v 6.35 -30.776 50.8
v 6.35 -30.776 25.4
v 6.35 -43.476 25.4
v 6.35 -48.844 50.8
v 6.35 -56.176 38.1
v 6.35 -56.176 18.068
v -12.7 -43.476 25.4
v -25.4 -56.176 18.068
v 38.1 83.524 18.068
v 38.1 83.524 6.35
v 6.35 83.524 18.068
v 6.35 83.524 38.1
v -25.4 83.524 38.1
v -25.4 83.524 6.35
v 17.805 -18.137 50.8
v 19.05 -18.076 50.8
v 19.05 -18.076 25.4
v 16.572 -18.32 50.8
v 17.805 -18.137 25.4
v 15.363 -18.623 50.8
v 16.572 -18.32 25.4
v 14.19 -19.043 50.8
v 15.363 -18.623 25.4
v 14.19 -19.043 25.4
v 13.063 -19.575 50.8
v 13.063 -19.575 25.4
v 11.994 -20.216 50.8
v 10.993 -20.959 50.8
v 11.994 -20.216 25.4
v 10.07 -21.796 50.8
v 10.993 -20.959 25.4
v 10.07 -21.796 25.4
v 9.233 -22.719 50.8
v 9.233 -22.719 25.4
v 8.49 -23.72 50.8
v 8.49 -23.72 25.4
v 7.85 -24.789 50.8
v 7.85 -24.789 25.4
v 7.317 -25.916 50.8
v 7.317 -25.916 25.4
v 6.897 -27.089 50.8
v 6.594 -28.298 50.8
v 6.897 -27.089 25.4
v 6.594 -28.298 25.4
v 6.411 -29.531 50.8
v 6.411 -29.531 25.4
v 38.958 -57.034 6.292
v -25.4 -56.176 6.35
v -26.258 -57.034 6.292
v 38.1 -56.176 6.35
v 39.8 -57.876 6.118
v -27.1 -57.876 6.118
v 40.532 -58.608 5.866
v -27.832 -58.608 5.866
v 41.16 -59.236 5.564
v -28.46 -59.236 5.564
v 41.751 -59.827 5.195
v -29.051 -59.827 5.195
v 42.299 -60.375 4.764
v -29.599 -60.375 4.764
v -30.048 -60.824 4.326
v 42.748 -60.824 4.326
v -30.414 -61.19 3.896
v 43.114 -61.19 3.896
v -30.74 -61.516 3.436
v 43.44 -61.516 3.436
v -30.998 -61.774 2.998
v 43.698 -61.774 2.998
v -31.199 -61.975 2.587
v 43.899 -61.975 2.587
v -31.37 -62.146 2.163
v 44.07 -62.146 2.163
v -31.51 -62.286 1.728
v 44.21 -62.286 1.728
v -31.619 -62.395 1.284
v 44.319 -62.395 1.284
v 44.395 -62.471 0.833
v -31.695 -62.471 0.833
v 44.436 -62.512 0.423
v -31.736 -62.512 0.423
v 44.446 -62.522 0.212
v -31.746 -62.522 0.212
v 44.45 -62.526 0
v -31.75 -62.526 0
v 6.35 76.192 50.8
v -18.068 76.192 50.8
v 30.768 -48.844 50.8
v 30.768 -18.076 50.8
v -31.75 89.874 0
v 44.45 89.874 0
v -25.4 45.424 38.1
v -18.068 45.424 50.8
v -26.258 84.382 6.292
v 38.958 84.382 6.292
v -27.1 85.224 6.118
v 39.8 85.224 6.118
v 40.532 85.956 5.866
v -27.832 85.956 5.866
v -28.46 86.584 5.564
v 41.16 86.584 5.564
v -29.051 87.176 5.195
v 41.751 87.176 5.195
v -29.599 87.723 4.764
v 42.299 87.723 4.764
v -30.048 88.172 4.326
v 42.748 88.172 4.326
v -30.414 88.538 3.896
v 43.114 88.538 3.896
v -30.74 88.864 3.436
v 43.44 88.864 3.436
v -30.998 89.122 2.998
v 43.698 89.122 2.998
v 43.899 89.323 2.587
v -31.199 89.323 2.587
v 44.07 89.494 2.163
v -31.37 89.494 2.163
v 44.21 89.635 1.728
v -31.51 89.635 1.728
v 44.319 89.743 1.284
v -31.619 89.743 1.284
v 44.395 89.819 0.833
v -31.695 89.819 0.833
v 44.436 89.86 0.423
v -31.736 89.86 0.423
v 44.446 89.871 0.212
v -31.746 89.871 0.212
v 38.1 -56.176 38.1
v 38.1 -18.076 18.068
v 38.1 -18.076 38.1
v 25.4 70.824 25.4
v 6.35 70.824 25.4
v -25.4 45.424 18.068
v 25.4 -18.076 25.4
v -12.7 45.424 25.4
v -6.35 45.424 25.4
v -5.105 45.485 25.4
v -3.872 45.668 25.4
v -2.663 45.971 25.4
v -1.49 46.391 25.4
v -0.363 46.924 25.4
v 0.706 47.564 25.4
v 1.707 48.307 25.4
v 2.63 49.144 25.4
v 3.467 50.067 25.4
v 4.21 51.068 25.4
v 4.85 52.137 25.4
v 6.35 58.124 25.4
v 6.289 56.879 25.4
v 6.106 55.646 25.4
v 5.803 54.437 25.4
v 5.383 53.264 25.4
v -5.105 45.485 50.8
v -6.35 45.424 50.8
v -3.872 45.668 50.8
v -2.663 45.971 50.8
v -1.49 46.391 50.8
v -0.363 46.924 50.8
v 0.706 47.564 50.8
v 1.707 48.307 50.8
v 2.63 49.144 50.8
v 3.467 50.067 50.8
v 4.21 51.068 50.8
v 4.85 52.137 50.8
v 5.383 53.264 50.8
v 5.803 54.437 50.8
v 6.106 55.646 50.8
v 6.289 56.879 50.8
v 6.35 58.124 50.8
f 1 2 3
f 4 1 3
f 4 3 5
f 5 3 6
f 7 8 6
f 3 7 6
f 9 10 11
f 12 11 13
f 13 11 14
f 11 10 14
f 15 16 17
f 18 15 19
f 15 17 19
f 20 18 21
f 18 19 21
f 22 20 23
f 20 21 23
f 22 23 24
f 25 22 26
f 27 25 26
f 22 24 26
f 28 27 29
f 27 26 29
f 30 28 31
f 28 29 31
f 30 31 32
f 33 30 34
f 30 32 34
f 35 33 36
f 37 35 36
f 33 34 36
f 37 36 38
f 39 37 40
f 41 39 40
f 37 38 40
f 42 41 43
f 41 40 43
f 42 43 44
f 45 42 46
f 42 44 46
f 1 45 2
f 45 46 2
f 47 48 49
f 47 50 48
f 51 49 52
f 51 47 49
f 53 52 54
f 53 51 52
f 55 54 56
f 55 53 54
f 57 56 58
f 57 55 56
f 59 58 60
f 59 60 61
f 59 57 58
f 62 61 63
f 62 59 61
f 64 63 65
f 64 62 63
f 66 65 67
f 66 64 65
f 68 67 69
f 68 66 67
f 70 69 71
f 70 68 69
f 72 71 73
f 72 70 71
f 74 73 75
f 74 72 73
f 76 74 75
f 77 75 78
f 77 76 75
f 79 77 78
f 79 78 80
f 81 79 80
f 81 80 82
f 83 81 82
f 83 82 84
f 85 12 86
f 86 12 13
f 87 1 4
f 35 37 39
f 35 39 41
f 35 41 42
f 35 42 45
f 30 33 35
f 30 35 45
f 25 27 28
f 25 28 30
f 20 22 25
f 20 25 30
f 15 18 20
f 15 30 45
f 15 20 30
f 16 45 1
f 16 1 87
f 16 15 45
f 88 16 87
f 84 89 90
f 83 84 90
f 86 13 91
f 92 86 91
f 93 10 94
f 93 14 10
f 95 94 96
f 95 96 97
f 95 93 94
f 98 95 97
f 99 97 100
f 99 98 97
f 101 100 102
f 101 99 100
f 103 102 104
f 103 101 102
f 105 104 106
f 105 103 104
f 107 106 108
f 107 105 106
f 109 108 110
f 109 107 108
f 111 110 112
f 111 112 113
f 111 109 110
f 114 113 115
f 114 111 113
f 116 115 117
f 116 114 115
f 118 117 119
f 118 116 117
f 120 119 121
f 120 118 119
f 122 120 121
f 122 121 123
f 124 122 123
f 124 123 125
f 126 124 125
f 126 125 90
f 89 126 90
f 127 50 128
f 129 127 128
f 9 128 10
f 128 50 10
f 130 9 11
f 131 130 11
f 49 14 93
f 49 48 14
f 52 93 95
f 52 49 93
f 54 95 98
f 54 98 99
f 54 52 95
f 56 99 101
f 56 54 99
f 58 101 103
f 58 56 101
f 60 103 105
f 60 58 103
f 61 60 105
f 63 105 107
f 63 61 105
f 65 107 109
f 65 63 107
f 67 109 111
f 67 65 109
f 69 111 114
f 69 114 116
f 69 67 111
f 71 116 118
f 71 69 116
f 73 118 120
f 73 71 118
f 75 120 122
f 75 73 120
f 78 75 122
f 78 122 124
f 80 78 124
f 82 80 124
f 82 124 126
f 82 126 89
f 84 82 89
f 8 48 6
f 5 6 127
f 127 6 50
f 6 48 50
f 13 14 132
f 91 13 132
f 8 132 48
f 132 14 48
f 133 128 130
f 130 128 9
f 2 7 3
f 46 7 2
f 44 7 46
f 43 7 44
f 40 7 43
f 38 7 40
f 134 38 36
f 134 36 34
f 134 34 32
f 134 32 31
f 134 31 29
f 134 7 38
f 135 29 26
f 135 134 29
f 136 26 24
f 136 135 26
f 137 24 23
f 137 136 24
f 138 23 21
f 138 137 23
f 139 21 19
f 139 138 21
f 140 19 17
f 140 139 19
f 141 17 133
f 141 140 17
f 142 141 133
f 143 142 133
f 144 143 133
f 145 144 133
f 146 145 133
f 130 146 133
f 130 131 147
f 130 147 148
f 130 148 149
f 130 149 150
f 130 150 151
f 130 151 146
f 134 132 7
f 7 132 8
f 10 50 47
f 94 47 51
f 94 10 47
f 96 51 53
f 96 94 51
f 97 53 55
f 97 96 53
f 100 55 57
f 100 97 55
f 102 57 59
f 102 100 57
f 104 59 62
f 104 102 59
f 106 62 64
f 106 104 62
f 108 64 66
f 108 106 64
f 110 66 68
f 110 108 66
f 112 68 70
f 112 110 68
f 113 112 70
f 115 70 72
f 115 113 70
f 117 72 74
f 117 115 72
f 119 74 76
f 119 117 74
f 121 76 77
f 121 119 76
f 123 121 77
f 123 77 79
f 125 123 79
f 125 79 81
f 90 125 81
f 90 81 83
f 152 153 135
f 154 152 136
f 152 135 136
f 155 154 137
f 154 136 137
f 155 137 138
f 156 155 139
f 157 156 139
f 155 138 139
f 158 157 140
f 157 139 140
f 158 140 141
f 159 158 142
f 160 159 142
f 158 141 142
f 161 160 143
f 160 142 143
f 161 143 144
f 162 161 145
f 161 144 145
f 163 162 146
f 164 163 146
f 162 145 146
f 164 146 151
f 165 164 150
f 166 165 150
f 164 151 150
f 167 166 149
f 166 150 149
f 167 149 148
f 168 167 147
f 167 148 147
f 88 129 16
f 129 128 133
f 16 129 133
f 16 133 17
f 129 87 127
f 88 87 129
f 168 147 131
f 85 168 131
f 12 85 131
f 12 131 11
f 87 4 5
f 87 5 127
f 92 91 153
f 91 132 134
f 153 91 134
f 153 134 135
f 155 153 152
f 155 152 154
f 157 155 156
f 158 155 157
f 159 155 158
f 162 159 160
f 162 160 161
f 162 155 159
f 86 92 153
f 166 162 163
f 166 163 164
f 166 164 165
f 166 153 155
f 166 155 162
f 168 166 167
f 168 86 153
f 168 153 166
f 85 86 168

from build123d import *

# Parameters (mm, degrees)
F1_DEPTH    = 6.35
F2_DEPTH    = 25.4
F3_DEPTH    = 50.8
F4_C1_SIZE2 = 12.7
F4_C1_SIZE  = 7.3323484187
F4_C2_SIZE2 = 12.7
F4_C2_SIZE  = 7.3323484187
F5_SIZE2    = 7.3323484187
F5_SIZE     = 12.7
F6_SIZE2    = 7.3323484187
F6_SIZE     = 12.7
F7_R        = 6.34999


# Not quite as in the source:
# - a fillet or chamfer is up to 0.001 mm smaller than in the source, because OpenCascade refuses the exact size


with BuildPart() as f1:
    # F0 (on Top) → F1 (new body)
    with BuildSketch(Plane.XY):
        Polygon((44.45, 89.8741149127), (-31.75, 89.8741149127), (-31.75, 45.4241149127), (-31.75, -62.5258850873), (44.45, -62.5258850873), align=None)
        Polygon((-25.4, -56.1758850873), (-25.4, 45.4241149127), (-25.4, 83.5241149127), (6.35, 83.5241149127), (38.1, 83.5241149127), (38.1, -18.0758850873), (38.1, -56.1758850873), (6.35, -56.1758850873), align=None, mode=Mode.SUBTRACT)
    extrude(amount=F1_DEPTH)

    # F0 (on Top) → F2 (join)
    with BuildSketch(Plane.XY):
        with BuildLine():
            Line((-6.35, 45.4241149127), (-25.4, 45.4241149127))
            Line((-25.4, 45.4241149127), (-25.4, -56.1758850873))
            Line((-25.4, -56.1758850873), (6.35, -56.1758850873))
            Line((6.35, -56.1758850873), (6.35, -30.7758850873))
            ThreePointArc((6.35, -30.7758850873), (10.0697438789, -21.7956289662), (19.05, -18.0758850873))
            Line((19.05, -18.0758850873), (38.1, -18.0758850873))
            Line((38.1, -18.0758850873), (38.1, 83.5241149127))
            Line((38.1, 83.5241149127), (6.35, 83.5241149127))
            Line((6.35, 83.5241149127), (6.35, 58.1241149127))
            ThreePointArc((6.35, 58.1241149127), (2.6302561211, 49.1438587917), (-6.35, 45.4241149127))
        make_face()
    extrude(amount=F2_DEPTH)

    # F0 (on Top) → F3 (join)
    with BuildSketch(Plane.XY):
        with BuildLine():
            Line((-25.4, 83.5241149127), (-25.4, 45.4241149127))
            Line((-25.4, 45.4241149127), (-6.35, 45.4241149127))
            ThreePointArc((-6.35, 45.4241149127), (2.6302561211, 49.1438587917), (6.35, 58.1241149127))
            Line((6.35, 58.1241149127), (6.35, 83.5241149127))
            Line((6.35, 83.5241149127), (-25.4, 83.5241149127))
        make_face()
        with BuildLine():
            Line((6.35, -30.7758850873), (6.35, -56.1758850873))
            Line((6.35, -56.1758850873), (38.1, -56.1758850873))
            Line((38.1, -56.1758850873), (38.1, -18.0758850873))
            Line((38.1, -18.0758850873), (19.05, -18.0758850873))
            ThreePointArc((19.05, -18.0758850873), (10.0697438789, -21.7956289662), (6.35, -30.7758850873))
        make_face()
    extrude(amount=F3_DEPTH)

    # F4: chamfer of 12.7 x 7.3323484187 on 2 edges, made by hand

    # F4_c1
    f4_c1_edges = [f1.edges().sort_by_distance(p)[0] for p in [
        (-9.525, 83.5241149127, 50.8),
    ]]
    f4_c1_side = f1.faces().sort_by_distance((-9.525, 83.3774679444, 50.8))[0]
    chamfer(f4_c1_edges, length=F4_C1_SIZE, length2=F4_C1_SIZE2, reference=f4_c1_side)

    # F4_c2
    f4_c2_edges = [f1.edges().sort_by_distance(p)[0] for p in [
        (-25.4, 60.8079407034, 50.8),
    ]]
    f4_c2_side = f1.faces().sort_by_distance((-25.2533530316, 60.8079407034, 50.8))[0]
    chamfer(f4_c2_edges, length=F4_C2_SIZE, length2=F4_C2_SIZE2, reference=f4_c2_side)

    # F5
    f5_edges = [f1.edges().sort_by_distance(p)[0] for p in [
        (38.1, -37.125885, 50.8),
        (22.225, -56.175885, 50.8),
    ]]
    chamfer(f5_edges, length=F5_SIZE, length2=F5_SIZE2)

    # F6
    f6_edges = [f1.edges().sort_by_distance(p)[0] for p in [
        (-25.4, -5.375885, 25.4),
        (-9.525, -56.175885, 25.4),
        (38.1, 32.724115, 25.4),
        (22.225, 83.524115, 25.4),
    ]]
    f6_side = f1.faces().sort_by_distance((6.35, 13.674115, 25.4))[0]
    chamfer(f6_edges, length=F6_SIZE, length2=F6_SIZE2, reference=f6_side)

    # F7 (radius 6.35 in the source; OpenCascade refuses exactly that, so slightly less here)
    f7_edges = [f1.edges().sort_by_distance(p)[0] for p in [
        (44.45, 13.674115, 6.35),
        (6.35, -62.525885, 6.35),
        (-31.75, 13.674115, 6.35),
        (6.35, 89.874115, 6.35),
    ]]
    fillet(f7_edges, radius=F7_R)


solid = f1.part
